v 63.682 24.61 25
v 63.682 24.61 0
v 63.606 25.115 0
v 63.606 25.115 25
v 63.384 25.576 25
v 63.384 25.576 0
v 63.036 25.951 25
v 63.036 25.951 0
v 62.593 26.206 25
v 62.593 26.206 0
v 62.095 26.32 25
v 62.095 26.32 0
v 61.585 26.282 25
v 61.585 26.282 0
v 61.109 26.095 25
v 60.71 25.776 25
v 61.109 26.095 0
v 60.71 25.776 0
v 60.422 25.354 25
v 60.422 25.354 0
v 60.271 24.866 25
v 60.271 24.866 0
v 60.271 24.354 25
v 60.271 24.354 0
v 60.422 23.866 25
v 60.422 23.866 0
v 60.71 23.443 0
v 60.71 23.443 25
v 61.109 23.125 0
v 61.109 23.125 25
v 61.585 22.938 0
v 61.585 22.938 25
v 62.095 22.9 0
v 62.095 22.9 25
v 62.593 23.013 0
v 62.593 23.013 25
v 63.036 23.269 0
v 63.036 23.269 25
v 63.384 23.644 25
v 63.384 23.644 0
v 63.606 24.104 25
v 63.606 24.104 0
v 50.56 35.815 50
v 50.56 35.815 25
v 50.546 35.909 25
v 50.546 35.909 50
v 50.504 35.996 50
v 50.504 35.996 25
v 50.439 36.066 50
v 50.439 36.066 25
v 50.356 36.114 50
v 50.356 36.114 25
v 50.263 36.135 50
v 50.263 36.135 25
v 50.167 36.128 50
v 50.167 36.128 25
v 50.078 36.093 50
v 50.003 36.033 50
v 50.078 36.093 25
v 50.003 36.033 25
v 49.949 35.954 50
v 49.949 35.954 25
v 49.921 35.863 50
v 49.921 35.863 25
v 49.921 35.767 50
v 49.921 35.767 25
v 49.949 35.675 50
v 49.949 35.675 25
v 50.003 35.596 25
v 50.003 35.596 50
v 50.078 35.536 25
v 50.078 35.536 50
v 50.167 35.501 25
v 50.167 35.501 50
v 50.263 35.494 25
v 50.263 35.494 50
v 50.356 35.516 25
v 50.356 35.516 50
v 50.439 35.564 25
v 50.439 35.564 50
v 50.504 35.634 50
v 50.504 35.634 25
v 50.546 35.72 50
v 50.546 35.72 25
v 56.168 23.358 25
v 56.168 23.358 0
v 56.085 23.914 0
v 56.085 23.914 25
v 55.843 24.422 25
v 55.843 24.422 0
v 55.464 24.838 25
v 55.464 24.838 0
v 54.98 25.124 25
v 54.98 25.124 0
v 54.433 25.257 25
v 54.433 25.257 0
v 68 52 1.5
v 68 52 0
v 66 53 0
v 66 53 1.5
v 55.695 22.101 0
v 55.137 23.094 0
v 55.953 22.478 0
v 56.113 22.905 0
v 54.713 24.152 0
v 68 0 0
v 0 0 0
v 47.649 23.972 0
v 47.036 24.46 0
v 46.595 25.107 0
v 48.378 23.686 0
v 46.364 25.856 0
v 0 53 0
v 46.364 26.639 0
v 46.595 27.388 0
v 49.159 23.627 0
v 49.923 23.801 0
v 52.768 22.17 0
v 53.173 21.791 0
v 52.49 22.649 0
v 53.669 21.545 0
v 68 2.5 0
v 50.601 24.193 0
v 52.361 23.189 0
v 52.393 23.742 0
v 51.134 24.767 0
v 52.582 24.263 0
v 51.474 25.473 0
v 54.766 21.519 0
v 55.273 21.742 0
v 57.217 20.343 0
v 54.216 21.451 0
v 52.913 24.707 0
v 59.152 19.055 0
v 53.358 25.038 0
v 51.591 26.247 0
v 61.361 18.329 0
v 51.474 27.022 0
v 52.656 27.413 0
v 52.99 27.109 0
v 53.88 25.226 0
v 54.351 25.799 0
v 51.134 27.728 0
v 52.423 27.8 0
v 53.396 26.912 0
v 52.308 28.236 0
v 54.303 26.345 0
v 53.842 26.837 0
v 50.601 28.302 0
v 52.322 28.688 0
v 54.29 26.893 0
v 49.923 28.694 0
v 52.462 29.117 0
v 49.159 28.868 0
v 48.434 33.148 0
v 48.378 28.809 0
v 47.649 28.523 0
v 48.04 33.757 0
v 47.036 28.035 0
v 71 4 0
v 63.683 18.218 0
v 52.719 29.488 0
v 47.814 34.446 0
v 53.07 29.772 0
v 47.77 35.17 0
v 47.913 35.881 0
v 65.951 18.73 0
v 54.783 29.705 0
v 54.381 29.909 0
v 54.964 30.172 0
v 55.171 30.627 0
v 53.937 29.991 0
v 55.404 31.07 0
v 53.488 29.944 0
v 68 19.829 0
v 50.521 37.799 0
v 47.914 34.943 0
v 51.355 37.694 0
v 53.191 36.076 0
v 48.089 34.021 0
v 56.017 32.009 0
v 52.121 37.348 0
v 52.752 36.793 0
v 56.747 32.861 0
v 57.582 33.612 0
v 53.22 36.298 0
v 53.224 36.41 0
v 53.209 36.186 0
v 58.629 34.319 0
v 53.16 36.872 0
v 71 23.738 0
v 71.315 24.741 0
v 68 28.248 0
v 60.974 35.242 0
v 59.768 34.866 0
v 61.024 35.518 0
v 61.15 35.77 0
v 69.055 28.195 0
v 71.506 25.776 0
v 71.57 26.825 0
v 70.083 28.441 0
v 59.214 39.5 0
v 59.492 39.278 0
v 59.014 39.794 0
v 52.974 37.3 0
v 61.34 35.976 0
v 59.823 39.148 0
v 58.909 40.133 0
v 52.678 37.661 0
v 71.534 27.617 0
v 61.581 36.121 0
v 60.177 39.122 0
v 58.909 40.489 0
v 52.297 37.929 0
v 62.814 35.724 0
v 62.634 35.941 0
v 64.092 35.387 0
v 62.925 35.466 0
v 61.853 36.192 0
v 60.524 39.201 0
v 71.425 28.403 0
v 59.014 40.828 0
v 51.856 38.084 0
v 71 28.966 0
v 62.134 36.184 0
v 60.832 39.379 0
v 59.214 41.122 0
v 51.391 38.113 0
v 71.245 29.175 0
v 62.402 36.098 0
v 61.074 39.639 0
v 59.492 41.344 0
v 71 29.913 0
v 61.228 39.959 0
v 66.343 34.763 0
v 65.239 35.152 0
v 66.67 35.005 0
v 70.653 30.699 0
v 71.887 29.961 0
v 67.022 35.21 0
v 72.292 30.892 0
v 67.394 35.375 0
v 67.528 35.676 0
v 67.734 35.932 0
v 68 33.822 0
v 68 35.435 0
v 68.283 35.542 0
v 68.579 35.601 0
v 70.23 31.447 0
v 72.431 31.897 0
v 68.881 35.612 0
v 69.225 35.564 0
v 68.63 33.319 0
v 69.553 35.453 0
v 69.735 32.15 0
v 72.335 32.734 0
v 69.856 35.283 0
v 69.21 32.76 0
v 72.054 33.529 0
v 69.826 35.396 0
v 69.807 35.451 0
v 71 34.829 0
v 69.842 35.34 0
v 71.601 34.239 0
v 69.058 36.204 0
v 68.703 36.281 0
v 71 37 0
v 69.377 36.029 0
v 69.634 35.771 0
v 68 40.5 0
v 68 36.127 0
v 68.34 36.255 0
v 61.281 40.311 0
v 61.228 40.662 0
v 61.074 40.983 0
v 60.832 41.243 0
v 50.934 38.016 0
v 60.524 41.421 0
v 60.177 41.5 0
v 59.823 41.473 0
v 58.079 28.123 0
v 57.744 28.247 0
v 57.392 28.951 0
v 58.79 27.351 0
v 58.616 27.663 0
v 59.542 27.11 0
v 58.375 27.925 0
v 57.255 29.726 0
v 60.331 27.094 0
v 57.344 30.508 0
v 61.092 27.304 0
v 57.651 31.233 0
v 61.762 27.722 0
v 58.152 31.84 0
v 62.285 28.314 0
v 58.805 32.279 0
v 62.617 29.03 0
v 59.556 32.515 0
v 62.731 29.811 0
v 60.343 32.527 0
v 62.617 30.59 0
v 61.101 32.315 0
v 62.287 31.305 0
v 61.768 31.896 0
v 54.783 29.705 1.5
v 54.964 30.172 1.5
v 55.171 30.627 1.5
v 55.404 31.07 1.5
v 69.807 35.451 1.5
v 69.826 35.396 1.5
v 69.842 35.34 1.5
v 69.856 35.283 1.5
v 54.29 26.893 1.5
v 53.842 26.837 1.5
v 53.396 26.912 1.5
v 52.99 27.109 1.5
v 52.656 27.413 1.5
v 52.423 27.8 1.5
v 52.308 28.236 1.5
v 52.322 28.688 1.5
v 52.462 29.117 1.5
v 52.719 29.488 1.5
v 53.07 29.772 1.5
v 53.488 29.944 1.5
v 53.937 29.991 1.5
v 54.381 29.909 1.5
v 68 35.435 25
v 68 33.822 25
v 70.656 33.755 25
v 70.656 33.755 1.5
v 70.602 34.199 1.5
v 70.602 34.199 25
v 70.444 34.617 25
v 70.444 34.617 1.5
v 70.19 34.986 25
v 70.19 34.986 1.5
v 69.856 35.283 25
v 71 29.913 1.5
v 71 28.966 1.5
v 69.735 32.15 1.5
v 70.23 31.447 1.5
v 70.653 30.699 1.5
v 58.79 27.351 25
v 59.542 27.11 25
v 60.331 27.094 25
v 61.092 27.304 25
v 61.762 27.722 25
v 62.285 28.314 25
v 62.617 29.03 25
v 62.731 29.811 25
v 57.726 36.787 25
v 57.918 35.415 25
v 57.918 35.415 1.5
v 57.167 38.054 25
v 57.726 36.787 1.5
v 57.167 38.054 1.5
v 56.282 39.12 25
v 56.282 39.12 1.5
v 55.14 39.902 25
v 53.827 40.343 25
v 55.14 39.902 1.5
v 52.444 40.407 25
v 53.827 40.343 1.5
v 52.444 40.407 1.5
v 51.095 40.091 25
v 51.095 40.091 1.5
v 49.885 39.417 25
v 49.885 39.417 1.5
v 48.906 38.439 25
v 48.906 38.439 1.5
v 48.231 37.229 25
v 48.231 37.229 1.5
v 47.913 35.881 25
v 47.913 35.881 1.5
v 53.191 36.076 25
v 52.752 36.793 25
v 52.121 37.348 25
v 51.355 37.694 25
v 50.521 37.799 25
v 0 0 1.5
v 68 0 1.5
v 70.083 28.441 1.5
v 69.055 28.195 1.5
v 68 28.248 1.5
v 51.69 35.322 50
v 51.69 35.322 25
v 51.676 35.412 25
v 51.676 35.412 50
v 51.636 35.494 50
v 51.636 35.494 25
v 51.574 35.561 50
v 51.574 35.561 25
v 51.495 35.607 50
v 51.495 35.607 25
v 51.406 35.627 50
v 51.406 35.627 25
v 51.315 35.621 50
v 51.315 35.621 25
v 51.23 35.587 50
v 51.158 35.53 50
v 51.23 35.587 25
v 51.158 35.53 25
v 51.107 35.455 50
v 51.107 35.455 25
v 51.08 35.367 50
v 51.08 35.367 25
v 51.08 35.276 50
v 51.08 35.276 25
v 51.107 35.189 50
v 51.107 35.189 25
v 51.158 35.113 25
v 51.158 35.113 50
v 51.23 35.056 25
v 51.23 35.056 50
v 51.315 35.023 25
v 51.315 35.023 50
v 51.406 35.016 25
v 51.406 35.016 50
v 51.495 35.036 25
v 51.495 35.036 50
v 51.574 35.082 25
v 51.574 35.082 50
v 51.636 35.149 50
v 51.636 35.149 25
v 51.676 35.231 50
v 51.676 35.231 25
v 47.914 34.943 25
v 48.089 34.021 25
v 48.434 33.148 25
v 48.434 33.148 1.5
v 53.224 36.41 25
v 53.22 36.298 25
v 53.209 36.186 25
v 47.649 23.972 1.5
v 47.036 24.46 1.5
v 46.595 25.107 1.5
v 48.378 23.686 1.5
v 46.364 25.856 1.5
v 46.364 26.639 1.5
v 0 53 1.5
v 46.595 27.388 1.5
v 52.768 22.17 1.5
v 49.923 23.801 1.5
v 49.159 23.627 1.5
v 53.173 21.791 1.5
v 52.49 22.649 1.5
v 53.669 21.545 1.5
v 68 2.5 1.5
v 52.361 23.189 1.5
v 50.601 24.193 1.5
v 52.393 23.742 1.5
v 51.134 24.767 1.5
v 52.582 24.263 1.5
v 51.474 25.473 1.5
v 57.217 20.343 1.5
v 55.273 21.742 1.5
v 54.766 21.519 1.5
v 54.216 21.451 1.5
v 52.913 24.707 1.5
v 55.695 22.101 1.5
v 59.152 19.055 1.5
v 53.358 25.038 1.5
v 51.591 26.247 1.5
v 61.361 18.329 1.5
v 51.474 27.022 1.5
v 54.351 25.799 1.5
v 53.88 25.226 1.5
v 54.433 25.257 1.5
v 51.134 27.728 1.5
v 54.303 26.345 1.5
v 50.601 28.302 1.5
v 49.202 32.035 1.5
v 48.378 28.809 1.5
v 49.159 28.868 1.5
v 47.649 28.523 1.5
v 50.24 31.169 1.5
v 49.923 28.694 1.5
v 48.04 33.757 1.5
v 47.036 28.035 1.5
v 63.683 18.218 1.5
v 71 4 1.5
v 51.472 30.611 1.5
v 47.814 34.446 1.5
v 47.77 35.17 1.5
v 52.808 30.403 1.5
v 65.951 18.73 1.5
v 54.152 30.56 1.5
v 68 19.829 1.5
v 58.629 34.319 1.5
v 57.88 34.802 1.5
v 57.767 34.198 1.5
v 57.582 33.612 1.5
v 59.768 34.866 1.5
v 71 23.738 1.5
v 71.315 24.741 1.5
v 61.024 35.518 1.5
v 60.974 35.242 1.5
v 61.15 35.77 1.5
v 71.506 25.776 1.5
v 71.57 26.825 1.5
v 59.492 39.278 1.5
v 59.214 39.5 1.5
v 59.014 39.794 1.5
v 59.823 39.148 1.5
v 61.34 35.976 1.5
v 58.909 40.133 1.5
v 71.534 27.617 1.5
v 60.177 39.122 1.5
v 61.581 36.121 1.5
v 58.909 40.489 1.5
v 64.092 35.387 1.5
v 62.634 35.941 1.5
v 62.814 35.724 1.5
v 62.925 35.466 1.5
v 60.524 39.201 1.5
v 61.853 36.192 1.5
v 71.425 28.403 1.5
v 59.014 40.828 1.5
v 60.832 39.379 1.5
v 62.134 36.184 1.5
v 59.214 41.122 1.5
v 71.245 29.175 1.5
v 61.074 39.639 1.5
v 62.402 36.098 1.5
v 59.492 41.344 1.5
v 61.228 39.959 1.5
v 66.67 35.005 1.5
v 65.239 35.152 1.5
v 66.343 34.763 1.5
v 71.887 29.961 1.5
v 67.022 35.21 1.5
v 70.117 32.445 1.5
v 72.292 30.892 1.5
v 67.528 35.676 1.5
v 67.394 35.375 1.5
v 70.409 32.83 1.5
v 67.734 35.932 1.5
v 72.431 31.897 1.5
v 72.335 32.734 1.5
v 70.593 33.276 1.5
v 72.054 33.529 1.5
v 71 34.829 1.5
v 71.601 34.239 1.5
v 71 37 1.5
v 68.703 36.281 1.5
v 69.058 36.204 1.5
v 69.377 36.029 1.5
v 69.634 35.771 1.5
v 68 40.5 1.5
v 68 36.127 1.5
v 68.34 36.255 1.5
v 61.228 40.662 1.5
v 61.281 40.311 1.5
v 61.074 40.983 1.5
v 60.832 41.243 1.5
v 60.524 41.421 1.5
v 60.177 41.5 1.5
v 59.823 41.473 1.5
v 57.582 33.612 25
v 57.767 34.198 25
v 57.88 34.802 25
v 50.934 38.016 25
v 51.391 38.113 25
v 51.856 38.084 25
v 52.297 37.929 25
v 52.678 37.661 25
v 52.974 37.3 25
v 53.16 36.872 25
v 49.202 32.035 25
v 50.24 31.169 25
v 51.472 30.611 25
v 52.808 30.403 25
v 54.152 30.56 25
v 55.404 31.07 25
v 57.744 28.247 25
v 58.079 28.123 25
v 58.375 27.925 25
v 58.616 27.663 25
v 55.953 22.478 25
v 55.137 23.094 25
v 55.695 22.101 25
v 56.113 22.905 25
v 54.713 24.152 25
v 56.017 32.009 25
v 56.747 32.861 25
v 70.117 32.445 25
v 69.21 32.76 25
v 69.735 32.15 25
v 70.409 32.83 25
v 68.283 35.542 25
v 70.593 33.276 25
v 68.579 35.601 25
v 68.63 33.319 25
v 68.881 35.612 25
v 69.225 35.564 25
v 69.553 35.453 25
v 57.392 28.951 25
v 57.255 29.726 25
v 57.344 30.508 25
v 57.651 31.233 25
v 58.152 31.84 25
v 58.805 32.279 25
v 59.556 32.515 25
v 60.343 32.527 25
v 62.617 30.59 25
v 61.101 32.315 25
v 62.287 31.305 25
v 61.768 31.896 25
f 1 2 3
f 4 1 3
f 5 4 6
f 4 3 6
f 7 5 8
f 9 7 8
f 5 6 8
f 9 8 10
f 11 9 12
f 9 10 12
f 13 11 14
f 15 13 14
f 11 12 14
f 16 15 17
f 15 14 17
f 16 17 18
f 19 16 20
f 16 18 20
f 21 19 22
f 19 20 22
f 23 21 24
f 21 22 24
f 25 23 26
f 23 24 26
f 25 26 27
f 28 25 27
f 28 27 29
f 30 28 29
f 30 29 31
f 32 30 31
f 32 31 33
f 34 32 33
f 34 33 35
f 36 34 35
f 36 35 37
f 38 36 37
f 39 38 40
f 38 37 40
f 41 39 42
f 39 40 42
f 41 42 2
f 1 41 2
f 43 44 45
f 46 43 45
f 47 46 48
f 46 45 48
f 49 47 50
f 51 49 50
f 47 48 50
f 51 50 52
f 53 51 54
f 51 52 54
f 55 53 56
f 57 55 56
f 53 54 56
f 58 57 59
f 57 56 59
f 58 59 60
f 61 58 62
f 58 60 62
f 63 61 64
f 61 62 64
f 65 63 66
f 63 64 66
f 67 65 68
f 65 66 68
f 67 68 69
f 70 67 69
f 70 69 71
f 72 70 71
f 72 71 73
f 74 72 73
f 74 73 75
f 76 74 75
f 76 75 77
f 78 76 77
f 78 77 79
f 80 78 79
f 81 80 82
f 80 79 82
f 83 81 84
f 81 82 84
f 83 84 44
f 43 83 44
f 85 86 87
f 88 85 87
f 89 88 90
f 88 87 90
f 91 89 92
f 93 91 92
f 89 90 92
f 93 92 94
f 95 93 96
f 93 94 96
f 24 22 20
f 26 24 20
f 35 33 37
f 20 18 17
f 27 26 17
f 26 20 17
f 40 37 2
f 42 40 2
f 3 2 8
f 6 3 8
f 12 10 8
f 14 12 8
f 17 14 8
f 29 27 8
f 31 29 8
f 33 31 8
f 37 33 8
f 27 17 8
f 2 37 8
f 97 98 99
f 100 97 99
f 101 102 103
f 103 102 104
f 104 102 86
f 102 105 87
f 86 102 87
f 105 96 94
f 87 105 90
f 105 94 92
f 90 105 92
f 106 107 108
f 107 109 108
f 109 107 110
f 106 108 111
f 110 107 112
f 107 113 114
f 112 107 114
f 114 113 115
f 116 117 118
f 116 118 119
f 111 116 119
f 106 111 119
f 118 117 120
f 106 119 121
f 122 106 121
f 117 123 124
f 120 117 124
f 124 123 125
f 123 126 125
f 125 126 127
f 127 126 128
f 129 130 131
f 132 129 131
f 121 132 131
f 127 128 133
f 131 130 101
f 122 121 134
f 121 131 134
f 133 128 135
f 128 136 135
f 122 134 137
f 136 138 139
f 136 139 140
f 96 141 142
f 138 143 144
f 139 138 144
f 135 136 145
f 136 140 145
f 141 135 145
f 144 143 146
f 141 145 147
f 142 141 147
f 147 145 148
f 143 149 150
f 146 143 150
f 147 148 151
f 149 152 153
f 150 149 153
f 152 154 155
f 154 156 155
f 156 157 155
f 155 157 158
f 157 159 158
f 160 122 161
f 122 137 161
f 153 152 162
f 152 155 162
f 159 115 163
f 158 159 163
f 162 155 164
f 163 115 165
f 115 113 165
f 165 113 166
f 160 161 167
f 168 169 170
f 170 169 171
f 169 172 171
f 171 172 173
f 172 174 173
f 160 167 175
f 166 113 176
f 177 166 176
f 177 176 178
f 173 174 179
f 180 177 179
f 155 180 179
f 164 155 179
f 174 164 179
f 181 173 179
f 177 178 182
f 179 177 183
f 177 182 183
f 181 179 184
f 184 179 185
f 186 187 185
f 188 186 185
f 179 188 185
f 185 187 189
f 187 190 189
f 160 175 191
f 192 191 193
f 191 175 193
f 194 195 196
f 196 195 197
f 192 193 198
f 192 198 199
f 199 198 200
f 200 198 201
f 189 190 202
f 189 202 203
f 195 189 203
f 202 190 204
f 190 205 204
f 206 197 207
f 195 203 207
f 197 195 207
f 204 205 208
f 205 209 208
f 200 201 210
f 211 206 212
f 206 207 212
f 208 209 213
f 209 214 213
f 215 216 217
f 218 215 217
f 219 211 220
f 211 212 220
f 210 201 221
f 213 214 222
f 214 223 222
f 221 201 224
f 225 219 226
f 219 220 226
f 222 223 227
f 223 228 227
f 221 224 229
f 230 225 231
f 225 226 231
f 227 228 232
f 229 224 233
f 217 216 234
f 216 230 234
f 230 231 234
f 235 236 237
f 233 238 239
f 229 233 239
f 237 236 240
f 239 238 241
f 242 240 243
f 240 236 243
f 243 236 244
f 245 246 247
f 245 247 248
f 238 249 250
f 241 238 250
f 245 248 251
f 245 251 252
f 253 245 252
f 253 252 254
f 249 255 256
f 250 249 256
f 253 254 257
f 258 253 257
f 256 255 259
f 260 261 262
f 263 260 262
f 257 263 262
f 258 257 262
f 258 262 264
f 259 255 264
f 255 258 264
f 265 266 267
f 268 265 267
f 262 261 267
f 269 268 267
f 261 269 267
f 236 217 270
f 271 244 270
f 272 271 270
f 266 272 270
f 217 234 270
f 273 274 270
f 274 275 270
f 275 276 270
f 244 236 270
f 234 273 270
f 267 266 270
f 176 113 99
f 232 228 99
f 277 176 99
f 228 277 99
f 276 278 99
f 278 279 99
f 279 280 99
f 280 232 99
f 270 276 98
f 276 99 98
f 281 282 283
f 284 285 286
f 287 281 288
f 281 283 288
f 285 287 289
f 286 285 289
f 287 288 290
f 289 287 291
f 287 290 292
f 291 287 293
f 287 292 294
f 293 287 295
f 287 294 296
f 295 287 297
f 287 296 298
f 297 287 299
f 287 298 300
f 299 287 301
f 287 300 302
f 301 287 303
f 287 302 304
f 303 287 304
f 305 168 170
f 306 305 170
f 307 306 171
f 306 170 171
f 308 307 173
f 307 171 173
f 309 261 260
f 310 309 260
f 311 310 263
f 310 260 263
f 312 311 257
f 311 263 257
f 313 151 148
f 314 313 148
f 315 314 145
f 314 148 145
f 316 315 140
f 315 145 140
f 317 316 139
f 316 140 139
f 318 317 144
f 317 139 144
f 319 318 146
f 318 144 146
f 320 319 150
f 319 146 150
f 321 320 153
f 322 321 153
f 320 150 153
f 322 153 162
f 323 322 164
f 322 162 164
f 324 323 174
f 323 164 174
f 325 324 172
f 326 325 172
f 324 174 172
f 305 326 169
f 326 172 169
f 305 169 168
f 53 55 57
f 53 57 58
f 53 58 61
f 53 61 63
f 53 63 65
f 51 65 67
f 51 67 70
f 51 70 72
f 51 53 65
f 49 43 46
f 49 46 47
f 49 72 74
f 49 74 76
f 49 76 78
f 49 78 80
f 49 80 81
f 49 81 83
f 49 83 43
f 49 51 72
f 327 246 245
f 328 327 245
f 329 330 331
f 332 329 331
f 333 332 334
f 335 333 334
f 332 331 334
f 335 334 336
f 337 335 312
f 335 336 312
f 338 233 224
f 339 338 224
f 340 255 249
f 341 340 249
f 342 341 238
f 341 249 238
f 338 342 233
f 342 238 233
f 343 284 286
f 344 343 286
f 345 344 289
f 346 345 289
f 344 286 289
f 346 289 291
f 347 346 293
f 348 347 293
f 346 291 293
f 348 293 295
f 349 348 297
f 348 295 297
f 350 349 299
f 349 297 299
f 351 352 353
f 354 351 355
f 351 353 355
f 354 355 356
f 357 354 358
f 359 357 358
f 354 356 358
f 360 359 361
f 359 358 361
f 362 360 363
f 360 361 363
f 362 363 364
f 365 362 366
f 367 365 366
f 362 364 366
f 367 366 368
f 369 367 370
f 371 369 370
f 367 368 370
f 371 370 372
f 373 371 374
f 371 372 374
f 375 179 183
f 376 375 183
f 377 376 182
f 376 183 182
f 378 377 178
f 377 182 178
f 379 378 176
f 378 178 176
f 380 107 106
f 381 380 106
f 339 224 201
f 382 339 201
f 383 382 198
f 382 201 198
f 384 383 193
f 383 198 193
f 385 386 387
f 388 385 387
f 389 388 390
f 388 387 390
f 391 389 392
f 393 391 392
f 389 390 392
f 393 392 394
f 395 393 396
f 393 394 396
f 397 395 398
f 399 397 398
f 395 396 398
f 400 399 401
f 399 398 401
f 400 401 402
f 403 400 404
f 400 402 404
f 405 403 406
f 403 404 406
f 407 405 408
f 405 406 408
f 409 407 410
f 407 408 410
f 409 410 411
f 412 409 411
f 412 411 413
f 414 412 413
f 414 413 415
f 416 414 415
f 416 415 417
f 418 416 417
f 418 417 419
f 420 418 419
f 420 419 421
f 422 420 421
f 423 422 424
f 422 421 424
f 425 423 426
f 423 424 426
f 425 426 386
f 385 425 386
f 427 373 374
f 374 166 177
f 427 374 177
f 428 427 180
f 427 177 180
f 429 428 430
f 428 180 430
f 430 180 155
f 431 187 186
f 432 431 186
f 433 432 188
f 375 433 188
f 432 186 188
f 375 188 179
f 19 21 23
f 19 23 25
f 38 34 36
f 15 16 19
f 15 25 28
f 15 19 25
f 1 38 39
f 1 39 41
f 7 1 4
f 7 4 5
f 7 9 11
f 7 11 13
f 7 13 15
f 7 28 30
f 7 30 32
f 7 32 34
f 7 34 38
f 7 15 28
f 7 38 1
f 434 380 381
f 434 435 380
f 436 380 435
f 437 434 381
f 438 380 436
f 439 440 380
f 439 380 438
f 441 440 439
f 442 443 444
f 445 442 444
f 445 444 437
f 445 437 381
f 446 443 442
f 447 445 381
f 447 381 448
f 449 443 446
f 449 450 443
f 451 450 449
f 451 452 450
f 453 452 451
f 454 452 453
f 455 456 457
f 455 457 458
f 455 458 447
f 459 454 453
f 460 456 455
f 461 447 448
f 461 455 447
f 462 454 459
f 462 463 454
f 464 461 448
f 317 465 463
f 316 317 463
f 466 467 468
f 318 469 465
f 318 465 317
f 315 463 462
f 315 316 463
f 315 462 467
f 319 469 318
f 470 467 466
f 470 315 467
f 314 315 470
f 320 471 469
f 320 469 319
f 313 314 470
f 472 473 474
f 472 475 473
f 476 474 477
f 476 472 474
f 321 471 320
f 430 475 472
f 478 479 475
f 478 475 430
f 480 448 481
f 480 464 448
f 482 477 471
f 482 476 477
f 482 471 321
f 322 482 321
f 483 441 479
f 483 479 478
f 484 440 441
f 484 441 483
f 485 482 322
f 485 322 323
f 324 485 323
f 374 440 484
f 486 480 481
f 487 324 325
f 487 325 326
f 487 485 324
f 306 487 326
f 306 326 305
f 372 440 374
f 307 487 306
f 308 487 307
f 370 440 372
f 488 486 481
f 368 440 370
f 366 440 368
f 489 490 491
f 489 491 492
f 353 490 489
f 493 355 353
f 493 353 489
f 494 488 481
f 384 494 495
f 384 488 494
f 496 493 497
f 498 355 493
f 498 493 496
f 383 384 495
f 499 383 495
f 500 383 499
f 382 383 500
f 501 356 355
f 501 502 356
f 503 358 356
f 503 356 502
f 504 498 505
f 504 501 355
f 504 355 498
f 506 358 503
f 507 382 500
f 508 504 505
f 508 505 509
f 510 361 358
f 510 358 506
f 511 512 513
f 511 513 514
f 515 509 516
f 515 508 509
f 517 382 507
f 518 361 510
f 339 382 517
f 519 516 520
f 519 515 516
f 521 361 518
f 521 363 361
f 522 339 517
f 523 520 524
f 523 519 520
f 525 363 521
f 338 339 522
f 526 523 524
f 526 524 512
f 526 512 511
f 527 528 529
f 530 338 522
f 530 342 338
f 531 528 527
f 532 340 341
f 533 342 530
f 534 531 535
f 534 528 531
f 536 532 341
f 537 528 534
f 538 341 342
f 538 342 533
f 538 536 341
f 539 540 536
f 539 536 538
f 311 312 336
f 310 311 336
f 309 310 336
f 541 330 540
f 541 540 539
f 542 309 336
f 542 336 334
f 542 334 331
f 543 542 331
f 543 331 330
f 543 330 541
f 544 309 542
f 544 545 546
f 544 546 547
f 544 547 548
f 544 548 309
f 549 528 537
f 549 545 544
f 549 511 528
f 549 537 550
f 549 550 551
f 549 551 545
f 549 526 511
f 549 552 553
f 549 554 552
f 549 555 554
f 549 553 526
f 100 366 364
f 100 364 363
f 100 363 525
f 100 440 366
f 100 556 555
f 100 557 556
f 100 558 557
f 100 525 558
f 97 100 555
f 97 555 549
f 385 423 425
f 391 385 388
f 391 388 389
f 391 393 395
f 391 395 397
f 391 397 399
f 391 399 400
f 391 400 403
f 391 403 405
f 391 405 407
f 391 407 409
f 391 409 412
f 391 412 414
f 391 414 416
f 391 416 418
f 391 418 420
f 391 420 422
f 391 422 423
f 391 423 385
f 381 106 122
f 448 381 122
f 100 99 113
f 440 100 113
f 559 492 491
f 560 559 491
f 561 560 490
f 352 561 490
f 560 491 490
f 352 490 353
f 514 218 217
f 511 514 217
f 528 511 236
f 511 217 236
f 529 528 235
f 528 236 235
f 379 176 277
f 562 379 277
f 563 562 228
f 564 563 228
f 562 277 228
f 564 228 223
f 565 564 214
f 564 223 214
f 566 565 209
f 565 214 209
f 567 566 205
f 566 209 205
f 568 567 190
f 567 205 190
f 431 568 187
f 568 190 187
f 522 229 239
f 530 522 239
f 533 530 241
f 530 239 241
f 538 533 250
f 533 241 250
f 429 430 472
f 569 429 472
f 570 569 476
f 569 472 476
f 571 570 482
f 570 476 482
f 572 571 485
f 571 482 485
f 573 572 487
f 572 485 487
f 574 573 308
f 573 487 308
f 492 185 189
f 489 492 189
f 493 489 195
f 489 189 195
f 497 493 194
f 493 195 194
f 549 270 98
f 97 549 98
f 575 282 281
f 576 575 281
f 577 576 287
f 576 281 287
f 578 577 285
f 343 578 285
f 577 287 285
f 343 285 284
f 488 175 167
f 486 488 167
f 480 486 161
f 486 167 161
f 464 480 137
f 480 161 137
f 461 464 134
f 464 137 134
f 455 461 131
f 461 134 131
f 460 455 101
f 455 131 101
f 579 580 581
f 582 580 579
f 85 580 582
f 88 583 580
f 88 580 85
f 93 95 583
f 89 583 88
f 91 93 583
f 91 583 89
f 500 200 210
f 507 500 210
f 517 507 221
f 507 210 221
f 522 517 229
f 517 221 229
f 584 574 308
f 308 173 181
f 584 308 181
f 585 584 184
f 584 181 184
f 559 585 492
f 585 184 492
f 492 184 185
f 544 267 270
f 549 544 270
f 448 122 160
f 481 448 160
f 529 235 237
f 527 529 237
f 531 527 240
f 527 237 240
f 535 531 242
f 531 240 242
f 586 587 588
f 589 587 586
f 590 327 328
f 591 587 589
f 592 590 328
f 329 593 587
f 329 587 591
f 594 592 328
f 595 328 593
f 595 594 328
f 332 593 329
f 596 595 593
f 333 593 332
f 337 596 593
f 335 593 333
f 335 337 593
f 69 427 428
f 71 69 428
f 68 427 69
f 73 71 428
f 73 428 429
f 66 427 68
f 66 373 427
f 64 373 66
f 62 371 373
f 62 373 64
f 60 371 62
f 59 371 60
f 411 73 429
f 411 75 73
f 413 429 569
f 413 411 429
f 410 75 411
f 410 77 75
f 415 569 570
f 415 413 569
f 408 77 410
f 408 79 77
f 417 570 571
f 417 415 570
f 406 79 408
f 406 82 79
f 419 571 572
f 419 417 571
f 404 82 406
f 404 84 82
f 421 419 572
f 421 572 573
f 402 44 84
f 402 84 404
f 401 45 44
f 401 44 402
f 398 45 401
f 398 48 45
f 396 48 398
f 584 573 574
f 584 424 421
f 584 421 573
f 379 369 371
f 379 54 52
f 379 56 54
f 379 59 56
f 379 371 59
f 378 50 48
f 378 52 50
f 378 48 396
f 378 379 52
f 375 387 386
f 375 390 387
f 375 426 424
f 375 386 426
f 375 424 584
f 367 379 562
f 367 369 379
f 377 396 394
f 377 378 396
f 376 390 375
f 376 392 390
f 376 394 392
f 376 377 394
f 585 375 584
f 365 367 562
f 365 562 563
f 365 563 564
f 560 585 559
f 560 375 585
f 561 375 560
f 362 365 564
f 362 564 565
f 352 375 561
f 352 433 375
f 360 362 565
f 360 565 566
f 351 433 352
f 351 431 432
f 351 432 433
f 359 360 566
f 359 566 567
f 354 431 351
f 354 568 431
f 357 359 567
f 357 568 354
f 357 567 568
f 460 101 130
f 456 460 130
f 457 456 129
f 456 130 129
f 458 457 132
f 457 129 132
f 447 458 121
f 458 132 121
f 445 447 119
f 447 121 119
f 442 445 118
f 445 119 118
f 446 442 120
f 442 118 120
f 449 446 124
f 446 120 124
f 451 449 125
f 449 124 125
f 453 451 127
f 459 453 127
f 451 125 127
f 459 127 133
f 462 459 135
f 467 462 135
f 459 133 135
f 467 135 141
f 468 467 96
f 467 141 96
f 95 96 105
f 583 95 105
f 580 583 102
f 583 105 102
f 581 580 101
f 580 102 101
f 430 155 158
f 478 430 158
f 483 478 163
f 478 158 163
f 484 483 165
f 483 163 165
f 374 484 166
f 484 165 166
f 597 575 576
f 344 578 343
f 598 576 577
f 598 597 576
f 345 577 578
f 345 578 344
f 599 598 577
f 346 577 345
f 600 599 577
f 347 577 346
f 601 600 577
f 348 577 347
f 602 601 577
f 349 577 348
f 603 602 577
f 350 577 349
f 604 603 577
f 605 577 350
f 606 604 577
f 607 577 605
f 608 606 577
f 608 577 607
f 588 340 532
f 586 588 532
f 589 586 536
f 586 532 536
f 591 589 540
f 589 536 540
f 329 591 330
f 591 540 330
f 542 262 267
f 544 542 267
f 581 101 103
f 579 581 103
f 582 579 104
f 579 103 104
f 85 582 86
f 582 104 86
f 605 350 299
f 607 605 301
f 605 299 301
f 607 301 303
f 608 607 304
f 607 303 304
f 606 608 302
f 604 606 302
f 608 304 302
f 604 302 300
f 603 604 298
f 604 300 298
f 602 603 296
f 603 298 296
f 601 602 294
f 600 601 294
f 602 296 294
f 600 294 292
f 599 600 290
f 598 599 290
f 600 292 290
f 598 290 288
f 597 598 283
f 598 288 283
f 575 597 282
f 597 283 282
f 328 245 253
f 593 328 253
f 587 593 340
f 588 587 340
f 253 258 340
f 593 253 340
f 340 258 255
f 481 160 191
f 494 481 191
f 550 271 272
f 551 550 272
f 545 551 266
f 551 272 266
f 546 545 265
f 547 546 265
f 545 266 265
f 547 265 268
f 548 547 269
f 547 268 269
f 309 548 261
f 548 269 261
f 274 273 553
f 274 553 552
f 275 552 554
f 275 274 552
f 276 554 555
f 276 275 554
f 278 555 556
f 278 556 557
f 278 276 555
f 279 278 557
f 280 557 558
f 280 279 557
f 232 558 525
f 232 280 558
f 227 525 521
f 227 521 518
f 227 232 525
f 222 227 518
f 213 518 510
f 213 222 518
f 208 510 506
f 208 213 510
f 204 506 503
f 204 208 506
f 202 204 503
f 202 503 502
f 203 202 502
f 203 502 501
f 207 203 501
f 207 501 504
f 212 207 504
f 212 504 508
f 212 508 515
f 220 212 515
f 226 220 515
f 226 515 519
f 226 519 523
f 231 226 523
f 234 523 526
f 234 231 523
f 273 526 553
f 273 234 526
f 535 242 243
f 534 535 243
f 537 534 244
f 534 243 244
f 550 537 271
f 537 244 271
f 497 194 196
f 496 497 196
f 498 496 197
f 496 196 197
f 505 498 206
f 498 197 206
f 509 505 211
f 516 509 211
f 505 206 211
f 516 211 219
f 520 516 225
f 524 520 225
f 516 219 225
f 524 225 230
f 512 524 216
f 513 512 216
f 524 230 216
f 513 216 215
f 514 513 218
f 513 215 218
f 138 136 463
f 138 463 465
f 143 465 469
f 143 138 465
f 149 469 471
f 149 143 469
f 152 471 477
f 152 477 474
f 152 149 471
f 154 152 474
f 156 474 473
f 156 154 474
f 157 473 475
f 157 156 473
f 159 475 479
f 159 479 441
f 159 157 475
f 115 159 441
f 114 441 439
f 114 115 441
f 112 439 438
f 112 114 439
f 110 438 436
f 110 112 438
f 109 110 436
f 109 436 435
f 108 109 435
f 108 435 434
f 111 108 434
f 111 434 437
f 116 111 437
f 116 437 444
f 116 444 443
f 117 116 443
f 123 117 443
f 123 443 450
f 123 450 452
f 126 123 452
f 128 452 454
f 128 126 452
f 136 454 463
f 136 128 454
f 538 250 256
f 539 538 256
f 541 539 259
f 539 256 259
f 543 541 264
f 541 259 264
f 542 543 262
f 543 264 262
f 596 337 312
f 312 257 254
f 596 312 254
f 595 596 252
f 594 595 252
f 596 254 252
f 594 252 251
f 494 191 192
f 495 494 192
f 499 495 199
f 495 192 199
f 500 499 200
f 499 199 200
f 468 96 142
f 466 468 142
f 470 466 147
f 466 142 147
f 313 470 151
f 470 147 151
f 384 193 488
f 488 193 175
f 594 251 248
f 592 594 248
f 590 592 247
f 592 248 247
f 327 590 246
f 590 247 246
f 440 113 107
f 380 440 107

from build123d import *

# Parameters (mm, degrees)
F0_R     = 2.6278375122
F0_R_2   = 1.1924493759
F1_DEPTH = 1.5
F2_DEPTH = 25
F0_R_3   = 1.7150177914
F3_R     = 0.3066007816
F3_R_2   = 0.3212661132
F4_DEPTH = 25
F5_DEPTH = 25


with BuildPart() as f1:
    # F0 (on Top) → F1 (new body)
    with BuildSketch(Plane.XY):
        with BuildLine():
            Line((0, 53), (0, 0))
            Line((0, 0), (68, 0))
            Line((68, 0), (68, 2.5))
            Line((68, 2.5), (68, 19.8288588746))
            ThreePointArc((68, 19.8288588746), (61.3608271995, 18.3286541388), (55.6953940617, 22.1011993122))
            ThreePointArc((55.6953940617, 22.1011993122), (52.4899736453, 22.6494230493), (54.4330548178, 25.2570474218))
            ThreePointArc((54.4330548178, 25.2570474218), (54.3224861562, 26.0713778864), (54.289781951, 26.8925294981))
            ThreePointArc((54.289781951, 26.8925294981), (52.3215154133, 28.6875368607), (54.7834433366, 29.7049038033))
            ThreePointArc((54.7834433366, 29.7049038033), (55.0640203529, 30.4009127933), (55.4039315186, 31.0699511896))
            ThreePointArc((55.4039315186, 31.0699511896), (51.4723174683, 30.611343819), (48.4336038497, 33.1479023744))
            ThreePointArc((48.4336038497, 33.1479023744), (47.8135649338, 34.4460507642), (47.91312779, 35.881224878))
            ThreePointArc((47.91312779, 35.881224878), (53.1376259317, 40.4230819927), (57.9175378005, 35.4154588629))
            ThreePointArc((57.9175378005, 35.4154588629), (57.8328911136, 34.4981199945), (57.5818096181, 33.6117601669))
            ThreePointArc((57.5818096181, 33.6117601669), (59.188306317, 34.613689426), (60.9744599761, 35.241661551))
            ThreePointArc((60.9744599761, 35.241661551), (61.8533262271, 36.1920987658), (62.9249150732, 35.4658521608))
            ThreePointArc((62.9249150732, 35.4658521608), (64.6695885562, 35.2889169352), (66.3426051765, 34.7633629182))
            ThreePointArc((66.3426051765, 34.7633629182), (66.8431977831, 35.1122947347), (67.3941141066, 35.3746638923))
            ThreePointArc((67.3941141066, 35.3746638923), (67.6228355533, 35.8105961465), (68, 36.1269778946))
            Line((68, 36.1269778946), (68, 37))
            Line((68, 37), (68, 40.5))
            Line((68, 40.5), (68, 52))
            Line((68, 52), (66, 53))
            Line((66, 53), (0, 53))
        make_face()
        with Locations((48.9628277719, 26.2474678457)):
            Circle(F0_R, mode=Mode.SUBTRACT)
        with Locations((60.0883662701, 40.3109230101)):
            Circle(F0_R_2, mode=Mode.SUBTRACT)
        with BuildLine():
            Line((68, 19.8288588746), (68, 2.5))
            Line((68, 2.5), (71, 4))
            Line((71, 4), (71, 23.7380924418))
            ThreePointArc((71, 23.7380924418), (69.7845899166, 21.5650774133), (68, 19.8288588746))
        make_face()
        with BuildLine():
            Line((68, 28.2475113294), (68, 19.8288588746))
            ThreePointArc((68, 19.8288588746), (69.7845899166, 21.5650774133), (71, 23.7380924418))
            Line((71, 23.7380924418), (71, 28.9656954726))
            ThreePointArc((71, 28.9656954726), (69.5779809067, 28.2808614275), (68, 28.2475113294))
        make_face()
        with BuildLine():
            Line((71, 28.9656954726), (71, 23.7380924418))
            ThreePointArc((71, 23.7380924418), (71.4265996488, 25.2556300447), (71.5703949044, 26.8254168332))
            ThreePointArc((71.5703949044, 26.8254168332), (71.488644419, 28.0111810019), (71.244939908, 29.1745072318))
            ThreePointArc((71.244939908, 29.1745072318), (71.1247301774, 29.06745007), (71, 28.9656954726))
        make_face()
        Polygon((71, 37), (68, 40.5), (68, 37), align=None)
        with BuildLine():
            Line((71, 29.9127412246), (71, 28.9656954726))
            ThreePointArc((71, 28.9656954726), (71.1247301774, 29.06745007), (71.244939908, 29.1745072318))
            ThreePointArc((71.244939908, 29.1745072318), (71.1307810974, 29.5463817966), (71, 29.9127412246))
        make_face()
        with BuildLine():
            Line((71, 37), (68, 37))
            Line((68, 37), (68, 36.1269778946))
            ThreePointArc((68, 36.1269778946), (69.0584871691, 36.2040282952), (69.8067182705, 35.4513782636))
            ThreePointArc((69.8067182705, 35.4513782636), (70.4317447612, 35.1946578959), (71, 34.8290769271))
            Line((71, 34.8290769271), (71, 37))
        make_face()
        with BuildLine():
            ThreePointArc((70.6559565162, 33.7548259768), (70.4093826923, 32.8295484731), (69.7350587516, 32.1496776527))
            ThreePointArc((69.7350587516, 32.1496776527), (70.4511573148, 31.0784993072), (71, 29.9127412246))
            Line((71, 29.9127412246), (71, 34.8290769271))
            ThreePointArc((71, 34.8290769271), (70.4317447612, 35.1946578959), (69.8067182705, 35.4513782636))
            ThreePointArc((69.8067182705, 35.4513782636), (69.8340876843, 35.3680821722), (69.8556518079, 35.2830979841))
            ThreePointArc((69.8556518079, 35.2830979841), (70.4437735665, 34.6173952428), (70.6559565162, 33.7548259768))
        make_face()
        with BuildLine():
            Line((71, 34.8290769271), (71, 29.9127412246))
            ThreePointArc((71, 29.9127412246), (71.1307810974, 29.5463817966), (71.244939908, 29.1745072318))
            ThreePointArc((71.244939908, 29.1745072318), (72.1215541699, 30.4124106248), (72.4309162817, 31.8973861998))
            ThreePointArc((72.4309162817, 31.8973861998), (72.0540953895, 33.5285155575), (71, 34.8290769271))
        make_face()
    extrude(amount=F1_DEPTH)

    # F0 (on Top) → F2, piece 2 (join)
    with BuildSketch(Plane.XY):
        with BuildLine():
            Line((68, 33.8991143367), (68, 33.8219747917))
            ThreePointArc((68, 33.8219747917), (68.9261149597, 33.0466105336), (69.7350587516, 32.1496776527))
            ThreePointArc((69.7350587516, 32.1496776527), (70.4093826923, 32.8295484731), (70.6559565162, 33.7548259768))
            ThreePointArc((70.6559565162, 33.7548259768), (70.4437735665, 34.6173952428), (69.8556518079, 35.2830979841))
            ThreePointArc((69.8556518079, 35.2830979841), (69.8773872009, 35.1488488132), (69.8846600648, 35.0130461156))
            ThreePointArc((69.8846600648, 35.0130461156), (69.2601125437, 33.9184243125), (68, 33.8991143367))
        make_face()
        with BuildLine():
            Line((68, 35.4348953571), (68, 33.8991143367))
            ThreePointArc((68, 33.8991143367), (69.2601125437, 33.9184243125), (69.8846600648, 35.0130461156))
            ThreePointArc((69.8846600648, 35.0130461156), (69.8773872009, 35.1488488132), (69.8556518079, 35.2830979841))
            ThreePointArc((69.8556518079, 35.2830979841), (69.3915424263, 35.5164301392), (68.8809966916, 35.6122657564))
            ThreePointArc((68.8809966916, 35.6122657564), (68.4296211931, 35.5776072464), (68, 35.4348953571))
        make_face()
        with BuildLine():
            ThreePointArc((55.4039315186, 31.0699511896), (56.3686096023, 32.4473252198), (57.5818096181, 33.6117601669))
            ThreePointArc((57.5818096181, 33.6117601669), (57.8328911136, 34.4981199945), (57.9175378005, 35.4154588629))
            ThreePointArc((57.9175378005, 35.4154588629), (53.1376259317, 40.4230819927), (47.91312779, 35.881224878))
            ThreePointArc((47.91312779, 35.881224878), (48.9153694852, 37.2508061123), (50.5214999846, 37.7990633442))
            ThreePointArc((50.5214999846, 37.7990633442), (52.2965293748, 37.9289651674), (53.2236828127, 36.4097580314))
            ThreePointArc((53.2236828127, 36.4097580314), (53.2154349825, 36.2420960388), (53.1907711372, 36.0760530769))
            ThreePointArc((53.1907711372, 36.0760530769), (53.3578818186, 35.5365305334), (53.414337444, 34.9745489348))
            ThreePointArc((53.414337444, 34.9745489348), (51.5618234293, 32.3219867398), (48.4336038497, 33.1479023744))
            ThreePointArc((48.4336038497, 33.1479023744), (51.4723174683, 30.611343819), (55.4039315186, 31.0699511896))
        make_face()
        with BuildLine():
            ThreePointArc((47.91312779, 35.881224878), (47.9799292355, 34.4777296591), (48.4336038497, 33.1479023744))
            ThreePointArc((48.4336038497, 33.1479023744), (51.5618234293, 32.3219867398), (53.414337444, 34.9745489348))
            ThreePointArc((53.414337444, 34.9745489348), (53.3578818186, 35.5365305334), (53.1907711372, 36.0760530769))
            ThreePointArc((53.1907711372, 36.0760530769), (50.5890162075, 34.9745489348), (50.5214999846, 37.7990633442))
            ThreePointArc((50.5214999846, 37.7990633442), (48.9153694852, 37.2508061123), (47.91312779, 35.881224878))
        make_face()
        with BuildLine():
            ThreePointArc((53.1907711372, 36.0760530769), (52.1212637564, 37.3482922946), (50.5214999846, 37.7990633442))
            ThreePointArc((50.5214999846, 37.7990633442), (50.5890162075, 34.9745489348), (53.1907711372, 36.0760530769))
        make_face()
    extrude(amount=F2_DEPTH)

    # F3 (on face) → F4 (join)
    with BuildSketch(Plane.XY.offset(25)):
        with Locations((51.3830035925, 35.3216975927)):
            Circle(F3_R)
        with Locations((50.2388849854, 35.8146764338)):
            Circle(F3_R_2)
    extrude(amount=-F4_DEPTH)

    # F3 (on face) → F5 (join)
    with BuildSketch(Plane.XY.offset(25)):
        with Locations((51.3830035925, 35.3216975927)):
            Circle(F3_R)
        with Locations((50.2388849854, 35.8146764338)):
            Circle(F3_R_2)
    extrude(amount=F5_DEPTH)


with BuildPart() as f2:
    # F0 (on Top) → F2 (new body)
    with BuildSketch(Plane.XY):
        with BuildLine():
            ThreePointArc((54.4330548178, 25.2570474218), (54.9075139378, 23.6164391663), (55.6953940617, 22.1011993122))
            ThreePointArc((55.6953940617, 22.1011993122), (56.0458256446, 22.686515355), (56.1678403419, 23.3577154577))
            ThreePointArc((56.1678403419, 23.3577154577), (55.668870425, 24.6438863954), (54.4330548178, 25.2570474218))
        make_face()
    extrude(amount=F2_DEPTH)


with BuildPart() as f2b:
    # F0 (on Top) → F2, piece 3 (new body)
    with BuildSketch(Plane.XY):
        with BuildLine():
            ThreePointArc((57.7444498964, 28.2469801579), (58.3749807915, 27.924921367), (58.7896853725, 27.3510649521))
            ThreePointArc((58.7896853725, 27.3510649521), (61.4423382614, 27.4885625868), (62.7305394701, 29.8114940524))
            ThreePointArc((62.7305394701, 29.8114940524), (59.1721797268, 32.4243848348), (57.7444498964, 28.2469801579))
        make_face()
    extrude(amount=F2_DEPTH)


with BuildPart() as f2c:
    # F0 (on Top) → F2, piece 4 (new body)
    with BuildSketch(Plane.XY):
        with Locations((61.9667060673, 24.6099419892)):
            Circle(F0_R_3)
    extrude(amount=F2_DEPTH)


solid = Compound([f1.part, f2.part, f2b.part, f2c.part])
